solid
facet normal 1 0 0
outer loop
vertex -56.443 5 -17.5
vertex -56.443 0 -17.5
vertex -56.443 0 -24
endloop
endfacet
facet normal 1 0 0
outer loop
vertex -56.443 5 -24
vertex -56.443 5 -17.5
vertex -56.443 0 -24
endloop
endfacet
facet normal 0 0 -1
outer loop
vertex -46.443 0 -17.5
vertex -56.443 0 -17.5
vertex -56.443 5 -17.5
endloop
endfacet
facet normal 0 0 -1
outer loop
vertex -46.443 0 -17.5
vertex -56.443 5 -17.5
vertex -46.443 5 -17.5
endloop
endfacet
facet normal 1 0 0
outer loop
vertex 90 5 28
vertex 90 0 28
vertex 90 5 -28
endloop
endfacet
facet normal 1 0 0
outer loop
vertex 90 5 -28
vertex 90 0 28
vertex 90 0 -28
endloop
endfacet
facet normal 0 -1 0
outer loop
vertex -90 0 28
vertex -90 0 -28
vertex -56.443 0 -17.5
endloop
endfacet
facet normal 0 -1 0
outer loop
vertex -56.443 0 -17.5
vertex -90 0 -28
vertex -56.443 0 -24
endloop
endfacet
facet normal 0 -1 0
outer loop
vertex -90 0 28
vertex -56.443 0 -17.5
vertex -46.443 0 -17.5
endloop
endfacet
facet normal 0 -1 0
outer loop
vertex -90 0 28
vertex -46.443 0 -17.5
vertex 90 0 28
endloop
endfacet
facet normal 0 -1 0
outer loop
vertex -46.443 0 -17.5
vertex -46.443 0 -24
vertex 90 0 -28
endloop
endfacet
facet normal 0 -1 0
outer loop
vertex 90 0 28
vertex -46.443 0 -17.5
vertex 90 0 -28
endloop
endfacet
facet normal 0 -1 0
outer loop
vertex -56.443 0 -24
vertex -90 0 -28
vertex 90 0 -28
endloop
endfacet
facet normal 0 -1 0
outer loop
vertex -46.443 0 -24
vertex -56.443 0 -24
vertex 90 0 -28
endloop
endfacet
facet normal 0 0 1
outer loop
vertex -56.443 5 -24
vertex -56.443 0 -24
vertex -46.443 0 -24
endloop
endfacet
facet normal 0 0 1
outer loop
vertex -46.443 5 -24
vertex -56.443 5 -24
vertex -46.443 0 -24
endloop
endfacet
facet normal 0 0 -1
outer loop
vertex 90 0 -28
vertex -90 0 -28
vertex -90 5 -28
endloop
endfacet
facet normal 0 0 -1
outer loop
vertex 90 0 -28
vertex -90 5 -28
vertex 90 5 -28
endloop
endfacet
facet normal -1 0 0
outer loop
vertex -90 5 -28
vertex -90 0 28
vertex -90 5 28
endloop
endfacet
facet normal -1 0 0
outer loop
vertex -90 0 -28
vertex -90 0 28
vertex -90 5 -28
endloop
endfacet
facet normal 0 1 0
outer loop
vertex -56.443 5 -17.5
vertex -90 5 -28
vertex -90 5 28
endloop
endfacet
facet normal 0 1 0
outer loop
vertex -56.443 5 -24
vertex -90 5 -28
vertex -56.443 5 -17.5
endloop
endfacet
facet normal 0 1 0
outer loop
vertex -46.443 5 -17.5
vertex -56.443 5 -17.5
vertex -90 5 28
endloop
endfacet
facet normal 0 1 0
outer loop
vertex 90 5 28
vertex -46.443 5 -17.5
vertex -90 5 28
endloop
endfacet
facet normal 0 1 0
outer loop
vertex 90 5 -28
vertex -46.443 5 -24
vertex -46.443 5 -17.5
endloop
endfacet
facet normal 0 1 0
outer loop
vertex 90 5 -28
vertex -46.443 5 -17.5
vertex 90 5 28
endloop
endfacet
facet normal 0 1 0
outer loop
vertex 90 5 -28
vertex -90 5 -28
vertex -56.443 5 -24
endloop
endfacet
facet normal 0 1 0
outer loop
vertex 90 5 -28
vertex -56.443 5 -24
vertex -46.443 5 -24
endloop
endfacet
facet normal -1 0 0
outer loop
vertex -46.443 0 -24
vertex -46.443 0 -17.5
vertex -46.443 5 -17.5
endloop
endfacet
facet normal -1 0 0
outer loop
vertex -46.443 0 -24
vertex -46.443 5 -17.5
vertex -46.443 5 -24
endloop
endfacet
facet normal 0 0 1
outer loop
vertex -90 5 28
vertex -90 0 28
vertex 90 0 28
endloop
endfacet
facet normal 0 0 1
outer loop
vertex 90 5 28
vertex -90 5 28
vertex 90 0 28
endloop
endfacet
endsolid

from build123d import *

# Parameters (mm, degrees)
IZIM1_W                     = 180
IZIM1_H                     = 56
IZIM1_W_2                   = 10
IZIM1_H_2                   = 6.5
Y_KSEKLIK_EKSTR_ZYON1_DEPTH = 5


with BuildPart() as part:
    # Çizim1 → Yükseklik-Ekstrüzyon1 (new body)
    with BuildSketch(Plane(origin=(0, 0, 0), x_dir=(1, 0, 0), z_dir=(0, 1, 0))):
        Rectangle(IZIM1_W, IZIM1_H)
        with Locations((-51.44343362, 20.75)):
            Rectangle(IZIM1_W_2, IZIM1_H_2, mode=Mode.SUBTRACT)
    extrude(amount=Y_KSEKLIK_EKSTR_ZYON1_DEPTH)


solid = part.part
